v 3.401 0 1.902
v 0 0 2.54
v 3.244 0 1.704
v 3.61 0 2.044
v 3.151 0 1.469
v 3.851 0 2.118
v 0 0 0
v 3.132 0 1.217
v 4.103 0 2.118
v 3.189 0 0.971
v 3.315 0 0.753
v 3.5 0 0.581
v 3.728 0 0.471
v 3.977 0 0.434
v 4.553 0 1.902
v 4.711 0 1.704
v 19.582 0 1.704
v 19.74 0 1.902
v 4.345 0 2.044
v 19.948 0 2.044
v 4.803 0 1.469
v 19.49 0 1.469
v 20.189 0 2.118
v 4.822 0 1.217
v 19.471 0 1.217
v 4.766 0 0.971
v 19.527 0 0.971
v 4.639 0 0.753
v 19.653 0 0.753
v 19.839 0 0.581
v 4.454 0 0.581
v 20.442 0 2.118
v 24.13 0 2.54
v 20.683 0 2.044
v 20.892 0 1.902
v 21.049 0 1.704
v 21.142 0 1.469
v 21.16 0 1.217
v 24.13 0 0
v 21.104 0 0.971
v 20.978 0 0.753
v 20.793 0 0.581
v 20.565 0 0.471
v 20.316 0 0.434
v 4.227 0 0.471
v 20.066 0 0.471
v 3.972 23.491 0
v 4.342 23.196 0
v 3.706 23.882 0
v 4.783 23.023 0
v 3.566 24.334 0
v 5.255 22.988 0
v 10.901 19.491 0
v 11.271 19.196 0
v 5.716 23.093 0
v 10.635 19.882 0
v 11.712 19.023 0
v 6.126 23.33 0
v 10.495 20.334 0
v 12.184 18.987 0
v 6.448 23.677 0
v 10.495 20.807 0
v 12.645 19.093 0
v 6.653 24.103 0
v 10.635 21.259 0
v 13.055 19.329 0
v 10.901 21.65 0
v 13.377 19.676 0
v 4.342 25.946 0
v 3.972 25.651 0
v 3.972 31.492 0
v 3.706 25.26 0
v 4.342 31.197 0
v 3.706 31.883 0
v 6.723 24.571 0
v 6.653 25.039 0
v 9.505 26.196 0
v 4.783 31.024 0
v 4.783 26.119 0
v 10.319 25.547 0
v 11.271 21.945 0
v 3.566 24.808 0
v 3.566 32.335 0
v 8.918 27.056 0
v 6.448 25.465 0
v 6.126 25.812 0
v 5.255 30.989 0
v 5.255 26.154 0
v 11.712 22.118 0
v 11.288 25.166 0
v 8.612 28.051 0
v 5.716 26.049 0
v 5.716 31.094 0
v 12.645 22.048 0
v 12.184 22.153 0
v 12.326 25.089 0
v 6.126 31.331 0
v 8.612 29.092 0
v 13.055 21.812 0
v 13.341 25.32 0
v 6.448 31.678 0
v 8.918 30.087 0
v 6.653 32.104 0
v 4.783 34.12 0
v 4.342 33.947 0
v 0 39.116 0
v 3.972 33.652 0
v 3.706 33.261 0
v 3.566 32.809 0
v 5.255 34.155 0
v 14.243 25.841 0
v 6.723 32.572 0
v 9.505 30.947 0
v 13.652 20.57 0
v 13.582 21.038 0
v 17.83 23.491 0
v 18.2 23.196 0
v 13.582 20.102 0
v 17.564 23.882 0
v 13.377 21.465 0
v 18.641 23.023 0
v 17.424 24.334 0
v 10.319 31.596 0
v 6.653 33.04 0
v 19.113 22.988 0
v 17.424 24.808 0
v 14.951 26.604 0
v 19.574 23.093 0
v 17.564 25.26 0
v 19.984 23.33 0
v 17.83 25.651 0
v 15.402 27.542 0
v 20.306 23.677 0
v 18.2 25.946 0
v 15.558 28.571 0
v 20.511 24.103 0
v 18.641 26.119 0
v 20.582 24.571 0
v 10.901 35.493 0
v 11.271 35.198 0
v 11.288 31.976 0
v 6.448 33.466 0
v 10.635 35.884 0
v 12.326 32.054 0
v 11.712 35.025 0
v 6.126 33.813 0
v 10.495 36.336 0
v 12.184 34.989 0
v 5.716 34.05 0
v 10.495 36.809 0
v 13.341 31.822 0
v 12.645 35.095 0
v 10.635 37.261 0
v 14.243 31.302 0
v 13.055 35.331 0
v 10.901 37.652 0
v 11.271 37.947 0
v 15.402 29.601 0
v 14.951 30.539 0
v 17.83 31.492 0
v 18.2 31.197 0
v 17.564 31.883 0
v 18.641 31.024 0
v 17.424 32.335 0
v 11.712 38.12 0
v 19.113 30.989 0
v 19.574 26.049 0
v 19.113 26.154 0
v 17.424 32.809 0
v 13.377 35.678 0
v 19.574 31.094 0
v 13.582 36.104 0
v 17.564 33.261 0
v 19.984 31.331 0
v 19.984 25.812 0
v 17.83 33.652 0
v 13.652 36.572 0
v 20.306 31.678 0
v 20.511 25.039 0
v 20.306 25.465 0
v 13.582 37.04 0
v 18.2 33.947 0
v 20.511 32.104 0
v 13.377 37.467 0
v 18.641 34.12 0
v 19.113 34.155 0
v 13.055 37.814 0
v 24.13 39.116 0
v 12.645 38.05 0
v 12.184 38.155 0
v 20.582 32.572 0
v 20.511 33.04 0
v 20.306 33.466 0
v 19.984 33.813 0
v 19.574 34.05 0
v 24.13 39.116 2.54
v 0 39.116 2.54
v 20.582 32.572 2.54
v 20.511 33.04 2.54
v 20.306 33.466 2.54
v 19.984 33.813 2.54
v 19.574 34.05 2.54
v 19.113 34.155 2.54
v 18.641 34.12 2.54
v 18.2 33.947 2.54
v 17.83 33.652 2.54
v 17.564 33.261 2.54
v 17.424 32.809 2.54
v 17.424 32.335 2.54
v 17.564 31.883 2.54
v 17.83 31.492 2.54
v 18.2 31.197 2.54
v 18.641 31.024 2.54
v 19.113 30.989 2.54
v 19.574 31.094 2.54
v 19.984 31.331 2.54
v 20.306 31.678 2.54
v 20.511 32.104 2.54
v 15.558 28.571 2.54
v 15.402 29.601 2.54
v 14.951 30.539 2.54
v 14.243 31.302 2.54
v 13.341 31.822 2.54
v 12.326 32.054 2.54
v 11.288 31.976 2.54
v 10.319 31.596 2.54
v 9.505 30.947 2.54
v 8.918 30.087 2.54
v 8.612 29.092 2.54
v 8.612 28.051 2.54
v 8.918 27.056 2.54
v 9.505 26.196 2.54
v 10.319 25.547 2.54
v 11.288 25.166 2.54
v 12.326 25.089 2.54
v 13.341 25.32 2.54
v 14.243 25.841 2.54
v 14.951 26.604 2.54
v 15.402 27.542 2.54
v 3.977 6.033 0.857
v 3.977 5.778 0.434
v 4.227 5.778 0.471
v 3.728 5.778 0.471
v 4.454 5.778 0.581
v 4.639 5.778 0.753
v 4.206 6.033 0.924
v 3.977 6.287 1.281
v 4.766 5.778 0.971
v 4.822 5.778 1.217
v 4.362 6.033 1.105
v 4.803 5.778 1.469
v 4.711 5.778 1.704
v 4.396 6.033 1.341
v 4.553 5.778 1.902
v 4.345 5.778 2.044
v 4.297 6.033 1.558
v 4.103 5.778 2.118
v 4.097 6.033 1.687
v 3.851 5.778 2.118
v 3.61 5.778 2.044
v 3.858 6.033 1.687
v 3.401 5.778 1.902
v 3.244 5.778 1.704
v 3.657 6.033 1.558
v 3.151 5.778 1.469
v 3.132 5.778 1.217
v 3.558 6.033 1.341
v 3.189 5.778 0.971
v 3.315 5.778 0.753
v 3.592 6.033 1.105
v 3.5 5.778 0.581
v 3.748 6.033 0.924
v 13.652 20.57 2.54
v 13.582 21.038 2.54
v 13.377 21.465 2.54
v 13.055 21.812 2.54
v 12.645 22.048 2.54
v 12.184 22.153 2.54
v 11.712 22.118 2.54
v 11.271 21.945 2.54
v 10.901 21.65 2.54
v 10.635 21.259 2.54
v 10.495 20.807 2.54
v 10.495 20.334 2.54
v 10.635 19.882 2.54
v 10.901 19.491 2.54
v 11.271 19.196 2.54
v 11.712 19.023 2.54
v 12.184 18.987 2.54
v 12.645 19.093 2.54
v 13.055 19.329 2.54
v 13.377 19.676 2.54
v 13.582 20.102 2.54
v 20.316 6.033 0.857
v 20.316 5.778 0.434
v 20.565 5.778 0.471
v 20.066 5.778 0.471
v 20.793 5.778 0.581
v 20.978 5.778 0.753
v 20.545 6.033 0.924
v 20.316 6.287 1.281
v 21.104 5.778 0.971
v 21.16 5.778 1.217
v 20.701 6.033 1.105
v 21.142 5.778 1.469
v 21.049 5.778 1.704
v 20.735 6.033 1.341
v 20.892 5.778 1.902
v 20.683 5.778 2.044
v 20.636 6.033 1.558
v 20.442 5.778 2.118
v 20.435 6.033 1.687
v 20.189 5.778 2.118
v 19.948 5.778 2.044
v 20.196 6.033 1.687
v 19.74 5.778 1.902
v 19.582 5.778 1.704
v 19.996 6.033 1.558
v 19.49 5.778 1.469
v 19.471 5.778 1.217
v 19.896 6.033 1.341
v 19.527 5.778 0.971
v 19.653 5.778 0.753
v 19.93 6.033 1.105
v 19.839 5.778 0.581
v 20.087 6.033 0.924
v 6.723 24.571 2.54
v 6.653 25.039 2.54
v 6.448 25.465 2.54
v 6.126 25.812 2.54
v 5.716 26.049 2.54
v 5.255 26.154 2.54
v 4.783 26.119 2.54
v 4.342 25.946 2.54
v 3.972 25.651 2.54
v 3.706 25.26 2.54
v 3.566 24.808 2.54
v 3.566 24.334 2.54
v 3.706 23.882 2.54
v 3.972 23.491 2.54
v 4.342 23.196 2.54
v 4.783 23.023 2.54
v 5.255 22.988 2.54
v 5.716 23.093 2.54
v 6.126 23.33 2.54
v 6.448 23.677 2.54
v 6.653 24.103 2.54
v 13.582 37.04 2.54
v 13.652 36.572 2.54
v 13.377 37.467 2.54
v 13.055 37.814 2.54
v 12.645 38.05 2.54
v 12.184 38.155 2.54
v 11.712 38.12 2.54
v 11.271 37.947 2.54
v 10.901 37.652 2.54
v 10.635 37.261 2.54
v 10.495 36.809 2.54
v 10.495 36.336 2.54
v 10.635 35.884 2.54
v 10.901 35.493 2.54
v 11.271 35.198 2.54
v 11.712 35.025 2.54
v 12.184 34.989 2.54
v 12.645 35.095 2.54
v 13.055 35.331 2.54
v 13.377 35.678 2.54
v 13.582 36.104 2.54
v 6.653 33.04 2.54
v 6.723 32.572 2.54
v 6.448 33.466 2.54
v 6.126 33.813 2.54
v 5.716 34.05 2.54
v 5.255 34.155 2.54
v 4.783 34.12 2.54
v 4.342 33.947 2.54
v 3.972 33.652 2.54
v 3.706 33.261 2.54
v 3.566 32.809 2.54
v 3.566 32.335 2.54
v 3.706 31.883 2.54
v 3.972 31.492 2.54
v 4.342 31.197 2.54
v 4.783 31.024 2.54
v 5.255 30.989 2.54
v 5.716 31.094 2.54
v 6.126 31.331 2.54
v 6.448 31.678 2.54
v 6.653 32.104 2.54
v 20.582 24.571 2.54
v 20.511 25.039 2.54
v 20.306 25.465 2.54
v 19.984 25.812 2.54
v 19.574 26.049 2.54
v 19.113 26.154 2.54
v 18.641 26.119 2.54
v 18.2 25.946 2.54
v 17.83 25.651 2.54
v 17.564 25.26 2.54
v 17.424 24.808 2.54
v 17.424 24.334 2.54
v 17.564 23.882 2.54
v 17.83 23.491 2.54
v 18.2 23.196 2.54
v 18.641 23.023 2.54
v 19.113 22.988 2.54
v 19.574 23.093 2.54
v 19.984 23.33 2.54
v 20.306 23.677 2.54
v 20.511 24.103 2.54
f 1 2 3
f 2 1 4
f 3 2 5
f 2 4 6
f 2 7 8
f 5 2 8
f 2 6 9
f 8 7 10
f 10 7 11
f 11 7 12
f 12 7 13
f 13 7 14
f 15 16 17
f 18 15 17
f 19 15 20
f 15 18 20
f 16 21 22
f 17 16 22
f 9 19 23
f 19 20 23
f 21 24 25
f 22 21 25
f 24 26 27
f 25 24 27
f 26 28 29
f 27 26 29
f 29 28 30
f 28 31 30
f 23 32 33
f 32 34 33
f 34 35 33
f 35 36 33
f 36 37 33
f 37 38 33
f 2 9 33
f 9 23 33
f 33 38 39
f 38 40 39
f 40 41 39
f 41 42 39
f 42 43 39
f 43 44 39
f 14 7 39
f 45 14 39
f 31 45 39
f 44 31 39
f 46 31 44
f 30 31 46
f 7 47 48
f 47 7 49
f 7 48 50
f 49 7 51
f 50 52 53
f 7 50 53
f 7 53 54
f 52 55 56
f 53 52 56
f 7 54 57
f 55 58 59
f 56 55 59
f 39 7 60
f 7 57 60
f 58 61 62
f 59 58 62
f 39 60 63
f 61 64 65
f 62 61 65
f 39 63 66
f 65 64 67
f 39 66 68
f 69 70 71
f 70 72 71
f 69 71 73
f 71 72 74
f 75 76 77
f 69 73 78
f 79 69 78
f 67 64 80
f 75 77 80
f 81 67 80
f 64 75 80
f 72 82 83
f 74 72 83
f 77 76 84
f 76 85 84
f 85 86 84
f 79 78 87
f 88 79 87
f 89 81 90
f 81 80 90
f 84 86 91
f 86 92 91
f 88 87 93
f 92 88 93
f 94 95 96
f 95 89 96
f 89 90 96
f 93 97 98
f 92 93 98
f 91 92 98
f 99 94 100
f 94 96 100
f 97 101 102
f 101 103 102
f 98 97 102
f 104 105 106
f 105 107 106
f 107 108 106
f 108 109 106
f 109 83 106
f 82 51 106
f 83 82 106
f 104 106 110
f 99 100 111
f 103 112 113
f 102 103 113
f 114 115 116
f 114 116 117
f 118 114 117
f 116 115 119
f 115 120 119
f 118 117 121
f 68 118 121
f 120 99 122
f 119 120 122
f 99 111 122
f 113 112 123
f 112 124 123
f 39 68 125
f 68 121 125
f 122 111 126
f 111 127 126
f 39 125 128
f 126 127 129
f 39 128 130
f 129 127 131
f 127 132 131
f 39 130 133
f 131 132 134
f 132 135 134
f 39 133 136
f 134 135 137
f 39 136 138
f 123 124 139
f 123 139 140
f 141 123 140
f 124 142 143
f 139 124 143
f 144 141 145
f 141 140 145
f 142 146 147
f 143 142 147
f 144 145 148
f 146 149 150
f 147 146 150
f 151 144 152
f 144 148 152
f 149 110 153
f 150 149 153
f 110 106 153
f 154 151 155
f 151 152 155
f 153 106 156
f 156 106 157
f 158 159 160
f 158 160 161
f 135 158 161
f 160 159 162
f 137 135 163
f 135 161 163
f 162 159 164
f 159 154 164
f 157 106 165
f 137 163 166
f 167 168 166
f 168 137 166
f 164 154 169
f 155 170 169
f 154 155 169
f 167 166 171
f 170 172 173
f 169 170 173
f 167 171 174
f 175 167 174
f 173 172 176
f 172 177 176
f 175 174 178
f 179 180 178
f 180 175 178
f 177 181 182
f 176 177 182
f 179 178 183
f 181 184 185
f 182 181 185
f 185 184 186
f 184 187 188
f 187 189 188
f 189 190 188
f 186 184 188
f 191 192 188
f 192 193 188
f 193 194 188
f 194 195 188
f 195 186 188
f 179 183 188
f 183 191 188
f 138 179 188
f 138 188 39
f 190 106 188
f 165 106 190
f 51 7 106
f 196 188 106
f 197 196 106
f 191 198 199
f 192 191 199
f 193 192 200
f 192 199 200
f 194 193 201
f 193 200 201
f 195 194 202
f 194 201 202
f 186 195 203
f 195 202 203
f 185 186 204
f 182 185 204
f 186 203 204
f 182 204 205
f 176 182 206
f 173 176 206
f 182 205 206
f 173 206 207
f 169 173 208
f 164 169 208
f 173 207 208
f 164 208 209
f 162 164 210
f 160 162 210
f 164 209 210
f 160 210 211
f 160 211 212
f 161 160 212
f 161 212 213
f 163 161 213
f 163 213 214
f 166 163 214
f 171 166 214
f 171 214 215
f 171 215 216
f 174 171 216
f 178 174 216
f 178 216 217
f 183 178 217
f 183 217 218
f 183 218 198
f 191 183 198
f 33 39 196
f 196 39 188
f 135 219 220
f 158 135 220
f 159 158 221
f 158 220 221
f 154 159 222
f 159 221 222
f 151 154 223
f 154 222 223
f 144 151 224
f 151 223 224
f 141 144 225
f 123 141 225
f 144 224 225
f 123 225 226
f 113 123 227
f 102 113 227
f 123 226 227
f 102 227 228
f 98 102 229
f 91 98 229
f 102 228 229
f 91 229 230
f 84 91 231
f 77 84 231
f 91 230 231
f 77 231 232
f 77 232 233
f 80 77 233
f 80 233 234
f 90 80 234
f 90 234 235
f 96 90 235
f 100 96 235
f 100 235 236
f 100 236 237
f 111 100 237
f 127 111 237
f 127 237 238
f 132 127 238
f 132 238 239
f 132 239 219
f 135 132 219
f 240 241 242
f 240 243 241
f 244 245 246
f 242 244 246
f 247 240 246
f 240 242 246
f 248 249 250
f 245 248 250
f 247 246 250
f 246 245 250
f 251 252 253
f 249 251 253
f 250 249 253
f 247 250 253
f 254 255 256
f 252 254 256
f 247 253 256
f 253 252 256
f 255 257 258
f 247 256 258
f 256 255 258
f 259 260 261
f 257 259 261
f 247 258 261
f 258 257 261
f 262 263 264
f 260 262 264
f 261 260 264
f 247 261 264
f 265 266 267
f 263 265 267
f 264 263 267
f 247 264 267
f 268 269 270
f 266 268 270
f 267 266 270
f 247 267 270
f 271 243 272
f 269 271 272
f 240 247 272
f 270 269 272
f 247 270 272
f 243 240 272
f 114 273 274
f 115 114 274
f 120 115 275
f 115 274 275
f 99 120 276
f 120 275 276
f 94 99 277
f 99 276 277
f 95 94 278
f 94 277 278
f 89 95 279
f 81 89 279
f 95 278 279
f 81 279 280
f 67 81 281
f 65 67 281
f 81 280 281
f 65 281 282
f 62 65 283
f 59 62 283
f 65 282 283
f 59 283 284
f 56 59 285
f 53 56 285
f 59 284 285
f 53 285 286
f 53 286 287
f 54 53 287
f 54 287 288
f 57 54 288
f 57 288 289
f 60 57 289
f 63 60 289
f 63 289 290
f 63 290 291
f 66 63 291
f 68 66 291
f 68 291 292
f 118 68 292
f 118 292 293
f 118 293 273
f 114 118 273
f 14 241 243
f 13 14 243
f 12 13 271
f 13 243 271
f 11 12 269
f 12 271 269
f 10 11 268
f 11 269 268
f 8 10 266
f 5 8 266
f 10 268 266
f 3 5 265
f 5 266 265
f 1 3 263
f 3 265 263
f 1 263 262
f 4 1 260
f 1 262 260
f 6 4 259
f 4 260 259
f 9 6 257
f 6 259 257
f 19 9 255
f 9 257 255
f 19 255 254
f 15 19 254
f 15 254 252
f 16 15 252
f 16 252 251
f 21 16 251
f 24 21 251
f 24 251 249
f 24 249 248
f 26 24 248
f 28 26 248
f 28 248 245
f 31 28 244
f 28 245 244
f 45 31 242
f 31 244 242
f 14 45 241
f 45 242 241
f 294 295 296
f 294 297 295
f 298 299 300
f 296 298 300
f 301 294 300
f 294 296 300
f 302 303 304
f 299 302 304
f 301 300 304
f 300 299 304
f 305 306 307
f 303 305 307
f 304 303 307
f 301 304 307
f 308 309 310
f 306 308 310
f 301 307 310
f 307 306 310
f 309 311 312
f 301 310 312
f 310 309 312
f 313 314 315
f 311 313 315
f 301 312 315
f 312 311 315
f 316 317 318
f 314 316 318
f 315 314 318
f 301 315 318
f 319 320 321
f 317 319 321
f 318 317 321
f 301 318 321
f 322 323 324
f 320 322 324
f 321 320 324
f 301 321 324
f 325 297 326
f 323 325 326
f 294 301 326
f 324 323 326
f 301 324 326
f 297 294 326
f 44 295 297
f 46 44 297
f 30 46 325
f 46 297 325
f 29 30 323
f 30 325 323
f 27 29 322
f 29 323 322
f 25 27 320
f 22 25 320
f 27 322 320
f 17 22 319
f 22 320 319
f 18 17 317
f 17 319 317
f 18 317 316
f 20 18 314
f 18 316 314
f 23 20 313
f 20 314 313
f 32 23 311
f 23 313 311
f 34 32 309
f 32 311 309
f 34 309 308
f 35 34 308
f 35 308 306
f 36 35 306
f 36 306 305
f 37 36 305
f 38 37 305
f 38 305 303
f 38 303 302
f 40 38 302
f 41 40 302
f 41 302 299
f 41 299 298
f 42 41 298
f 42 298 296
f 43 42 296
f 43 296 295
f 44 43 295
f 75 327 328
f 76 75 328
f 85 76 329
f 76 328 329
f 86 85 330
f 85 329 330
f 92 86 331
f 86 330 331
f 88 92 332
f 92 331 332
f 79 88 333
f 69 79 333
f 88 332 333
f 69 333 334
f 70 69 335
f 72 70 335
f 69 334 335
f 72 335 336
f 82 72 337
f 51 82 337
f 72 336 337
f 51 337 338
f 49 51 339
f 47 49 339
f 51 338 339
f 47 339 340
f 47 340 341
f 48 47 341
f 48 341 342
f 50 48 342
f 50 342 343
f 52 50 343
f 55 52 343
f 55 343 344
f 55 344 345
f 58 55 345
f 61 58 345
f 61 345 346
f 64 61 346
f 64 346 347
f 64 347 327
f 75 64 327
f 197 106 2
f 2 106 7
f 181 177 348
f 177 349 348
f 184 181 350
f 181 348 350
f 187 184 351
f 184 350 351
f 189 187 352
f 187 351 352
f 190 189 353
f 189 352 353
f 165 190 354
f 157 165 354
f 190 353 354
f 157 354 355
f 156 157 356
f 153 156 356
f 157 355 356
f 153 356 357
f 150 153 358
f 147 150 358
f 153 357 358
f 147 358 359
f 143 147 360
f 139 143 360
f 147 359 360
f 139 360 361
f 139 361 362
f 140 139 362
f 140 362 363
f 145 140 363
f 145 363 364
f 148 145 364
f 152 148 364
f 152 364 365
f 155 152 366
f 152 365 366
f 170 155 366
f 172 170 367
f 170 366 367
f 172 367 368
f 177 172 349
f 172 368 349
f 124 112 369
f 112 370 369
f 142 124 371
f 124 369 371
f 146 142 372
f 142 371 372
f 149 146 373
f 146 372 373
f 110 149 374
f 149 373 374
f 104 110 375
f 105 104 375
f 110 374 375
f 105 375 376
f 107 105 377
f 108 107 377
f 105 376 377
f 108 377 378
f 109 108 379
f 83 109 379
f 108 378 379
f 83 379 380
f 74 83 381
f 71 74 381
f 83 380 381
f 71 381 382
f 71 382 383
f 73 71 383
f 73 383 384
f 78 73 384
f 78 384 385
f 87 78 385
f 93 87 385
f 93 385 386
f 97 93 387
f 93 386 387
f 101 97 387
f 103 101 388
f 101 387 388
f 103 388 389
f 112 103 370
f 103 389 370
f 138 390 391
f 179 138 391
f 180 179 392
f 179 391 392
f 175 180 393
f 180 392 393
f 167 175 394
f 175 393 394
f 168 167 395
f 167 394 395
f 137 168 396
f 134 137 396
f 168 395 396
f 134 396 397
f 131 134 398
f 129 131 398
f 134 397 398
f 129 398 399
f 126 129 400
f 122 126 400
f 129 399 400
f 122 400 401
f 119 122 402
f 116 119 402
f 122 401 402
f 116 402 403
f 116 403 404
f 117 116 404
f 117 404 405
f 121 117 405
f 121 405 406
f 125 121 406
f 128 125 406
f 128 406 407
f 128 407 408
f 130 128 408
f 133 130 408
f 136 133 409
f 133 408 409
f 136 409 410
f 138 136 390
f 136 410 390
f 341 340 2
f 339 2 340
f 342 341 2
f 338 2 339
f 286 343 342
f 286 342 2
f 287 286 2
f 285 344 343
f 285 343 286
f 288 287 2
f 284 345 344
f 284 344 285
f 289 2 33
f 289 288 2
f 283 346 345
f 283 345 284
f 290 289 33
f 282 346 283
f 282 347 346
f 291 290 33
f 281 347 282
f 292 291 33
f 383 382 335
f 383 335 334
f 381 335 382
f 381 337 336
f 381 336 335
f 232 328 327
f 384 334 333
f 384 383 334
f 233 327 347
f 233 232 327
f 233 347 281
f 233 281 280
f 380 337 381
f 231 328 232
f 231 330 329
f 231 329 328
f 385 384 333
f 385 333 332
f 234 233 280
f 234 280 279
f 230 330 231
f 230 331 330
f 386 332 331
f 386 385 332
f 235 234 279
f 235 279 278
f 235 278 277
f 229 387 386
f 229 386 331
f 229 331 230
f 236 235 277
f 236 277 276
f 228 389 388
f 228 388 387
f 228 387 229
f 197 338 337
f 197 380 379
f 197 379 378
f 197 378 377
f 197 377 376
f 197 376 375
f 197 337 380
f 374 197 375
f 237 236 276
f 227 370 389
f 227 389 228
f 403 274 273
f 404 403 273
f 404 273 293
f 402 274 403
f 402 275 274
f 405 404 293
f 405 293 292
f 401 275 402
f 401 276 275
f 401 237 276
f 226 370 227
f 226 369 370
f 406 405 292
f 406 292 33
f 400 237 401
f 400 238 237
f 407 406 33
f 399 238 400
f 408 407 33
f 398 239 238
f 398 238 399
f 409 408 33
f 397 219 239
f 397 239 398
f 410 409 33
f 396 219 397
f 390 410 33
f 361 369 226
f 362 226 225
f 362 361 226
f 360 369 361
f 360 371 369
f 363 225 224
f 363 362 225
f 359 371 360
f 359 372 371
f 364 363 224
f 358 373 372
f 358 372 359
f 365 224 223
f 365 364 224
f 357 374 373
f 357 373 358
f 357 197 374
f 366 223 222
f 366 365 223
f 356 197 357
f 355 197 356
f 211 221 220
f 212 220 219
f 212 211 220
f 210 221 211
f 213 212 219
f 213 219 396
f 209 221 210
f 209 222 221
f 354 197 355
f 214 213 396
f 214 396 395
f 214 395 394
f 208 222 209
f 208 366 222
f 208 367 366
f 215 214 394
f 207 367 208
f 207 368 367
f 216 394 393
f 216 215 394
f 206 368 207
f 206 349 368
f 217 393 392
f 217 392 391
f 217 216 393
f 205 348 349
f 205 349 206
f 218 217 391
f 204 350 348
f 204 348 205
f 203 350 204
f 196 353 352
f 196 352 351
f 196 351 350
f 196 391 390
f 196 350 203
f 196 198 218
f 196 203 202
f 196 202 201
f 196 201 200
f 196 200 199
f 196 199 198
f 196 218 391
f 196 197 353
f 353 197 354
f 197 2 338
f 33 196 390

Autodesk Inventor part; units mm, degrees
ref_plane "YZ Plane" through (0, 0, 0) normal (1, 0, 0) x (0, 1, 0)
ref_plane "XZ Plane" through (0, 0, 0) normal (0, 1, 0) x (-1, 0, 0)
ref_plane "XY Plane" through (0, 0, 0) normal (0, 0, 1) x (1, 0, 0)
sketch "Sketch1" plane through (0, 0, 0) normal (0, 0, 1) x (1, 0, 0)
  line L0 (0, 0) -> (24.13, 0)
  line L1 (24.13, 0) -> (24.13, 39.116)
  line L2 (24.13, 39.116) -> (0, 39.116)
  line L3 (0, 39.116) -> (0, 0)
  dimension "d0" = 39.116
  dimension "d1" = 24.13
extrude "Extrusion1" add sketch "Sketch1" along normal blind 2.54
sketch "Sketch3" plane through (0, 0, 0) normal (0, -1, 0) x (1, 0, 0)
  circle A0 centre (3.9772, 1.2808) radius 0.9652
  circle A1 centre (20.3157, 1.2808) radius 0.9652
  point P0 (0, 0)
  dimension "d7" = 1.9304
  dimension "d8" = 1.9304
hole "Hole1" at (3.9772, 0, 1.2808) at (20.3157, 0, 1.2808) direction (0, 1, 0) diameter 1.6942 depth 5.7785 tip angle 118 thread size "2-56 UNC" class "2B" standard "ANSI Unified Screw Threads"
sketch "Sketch5" plane through (0, 0, 2.54) normal (0, 0, 1) x (1, 0, 0)
  circle A0 centre (12.065, 28.5714) radius 3.4925
  circle A1 centre (12.065, 28.5714) radius 8.001
  circle A2 centre (18.9941, 32.5719) radius 1.5875
  circle A3 centre (12.065, 36.5724) radius 1.5875
  circle A4 centre (12.065, 28.5714) radius 8.001
  circle A5 centre (5.1359, 32.5719) radius 1.5875
  circle A6 centre (12.065, 28.5714) radius 8.001
  circle A7 centre (5.1359, 24.5709) radius 1.5875
  circle A8 centre (12.065, 28.5714) radius 8.001
  circle A9 centre (12.065, 20.5704) radius 1.5875
  circle A10 centre (12.065, 28.5714) radius 8.001
  circle A11 centre (18.9941, 24.5709) radius 1.5875
  circle A12 centre (12.065, 28.5714) radius 8.001
  line L0 (24.13, 0) -> (24.13, 39.116) projected
  line L1 (24.13, 39.116) -> (0, 39.116) projected
  line L2 (0, 0) -> (24.13, 0) projected
  line L3 (12.065, 39.116) -> (12.065, 28.5714)
  dimension "d32" = 16.002
  dimension "d31" = 6.985
  dimension "d33" = 3.175
  dimension "d34" = 360
  dimension "d35" = 24.13
extrude "Extrusion4" cut sketch "Sketch5" against normal through all contours A0 | A3 A1 L3 | L3 A1 A3 | A3 L3 A1 | A1 L3 A3 | A5 A1 | A1 A5 | A2 A1 | A1 A2 | A7 A1 | A1 A7 | A11 A1 | A1 A11 | A9 A1 | A1 A9
properties part number "collection motor mount"
